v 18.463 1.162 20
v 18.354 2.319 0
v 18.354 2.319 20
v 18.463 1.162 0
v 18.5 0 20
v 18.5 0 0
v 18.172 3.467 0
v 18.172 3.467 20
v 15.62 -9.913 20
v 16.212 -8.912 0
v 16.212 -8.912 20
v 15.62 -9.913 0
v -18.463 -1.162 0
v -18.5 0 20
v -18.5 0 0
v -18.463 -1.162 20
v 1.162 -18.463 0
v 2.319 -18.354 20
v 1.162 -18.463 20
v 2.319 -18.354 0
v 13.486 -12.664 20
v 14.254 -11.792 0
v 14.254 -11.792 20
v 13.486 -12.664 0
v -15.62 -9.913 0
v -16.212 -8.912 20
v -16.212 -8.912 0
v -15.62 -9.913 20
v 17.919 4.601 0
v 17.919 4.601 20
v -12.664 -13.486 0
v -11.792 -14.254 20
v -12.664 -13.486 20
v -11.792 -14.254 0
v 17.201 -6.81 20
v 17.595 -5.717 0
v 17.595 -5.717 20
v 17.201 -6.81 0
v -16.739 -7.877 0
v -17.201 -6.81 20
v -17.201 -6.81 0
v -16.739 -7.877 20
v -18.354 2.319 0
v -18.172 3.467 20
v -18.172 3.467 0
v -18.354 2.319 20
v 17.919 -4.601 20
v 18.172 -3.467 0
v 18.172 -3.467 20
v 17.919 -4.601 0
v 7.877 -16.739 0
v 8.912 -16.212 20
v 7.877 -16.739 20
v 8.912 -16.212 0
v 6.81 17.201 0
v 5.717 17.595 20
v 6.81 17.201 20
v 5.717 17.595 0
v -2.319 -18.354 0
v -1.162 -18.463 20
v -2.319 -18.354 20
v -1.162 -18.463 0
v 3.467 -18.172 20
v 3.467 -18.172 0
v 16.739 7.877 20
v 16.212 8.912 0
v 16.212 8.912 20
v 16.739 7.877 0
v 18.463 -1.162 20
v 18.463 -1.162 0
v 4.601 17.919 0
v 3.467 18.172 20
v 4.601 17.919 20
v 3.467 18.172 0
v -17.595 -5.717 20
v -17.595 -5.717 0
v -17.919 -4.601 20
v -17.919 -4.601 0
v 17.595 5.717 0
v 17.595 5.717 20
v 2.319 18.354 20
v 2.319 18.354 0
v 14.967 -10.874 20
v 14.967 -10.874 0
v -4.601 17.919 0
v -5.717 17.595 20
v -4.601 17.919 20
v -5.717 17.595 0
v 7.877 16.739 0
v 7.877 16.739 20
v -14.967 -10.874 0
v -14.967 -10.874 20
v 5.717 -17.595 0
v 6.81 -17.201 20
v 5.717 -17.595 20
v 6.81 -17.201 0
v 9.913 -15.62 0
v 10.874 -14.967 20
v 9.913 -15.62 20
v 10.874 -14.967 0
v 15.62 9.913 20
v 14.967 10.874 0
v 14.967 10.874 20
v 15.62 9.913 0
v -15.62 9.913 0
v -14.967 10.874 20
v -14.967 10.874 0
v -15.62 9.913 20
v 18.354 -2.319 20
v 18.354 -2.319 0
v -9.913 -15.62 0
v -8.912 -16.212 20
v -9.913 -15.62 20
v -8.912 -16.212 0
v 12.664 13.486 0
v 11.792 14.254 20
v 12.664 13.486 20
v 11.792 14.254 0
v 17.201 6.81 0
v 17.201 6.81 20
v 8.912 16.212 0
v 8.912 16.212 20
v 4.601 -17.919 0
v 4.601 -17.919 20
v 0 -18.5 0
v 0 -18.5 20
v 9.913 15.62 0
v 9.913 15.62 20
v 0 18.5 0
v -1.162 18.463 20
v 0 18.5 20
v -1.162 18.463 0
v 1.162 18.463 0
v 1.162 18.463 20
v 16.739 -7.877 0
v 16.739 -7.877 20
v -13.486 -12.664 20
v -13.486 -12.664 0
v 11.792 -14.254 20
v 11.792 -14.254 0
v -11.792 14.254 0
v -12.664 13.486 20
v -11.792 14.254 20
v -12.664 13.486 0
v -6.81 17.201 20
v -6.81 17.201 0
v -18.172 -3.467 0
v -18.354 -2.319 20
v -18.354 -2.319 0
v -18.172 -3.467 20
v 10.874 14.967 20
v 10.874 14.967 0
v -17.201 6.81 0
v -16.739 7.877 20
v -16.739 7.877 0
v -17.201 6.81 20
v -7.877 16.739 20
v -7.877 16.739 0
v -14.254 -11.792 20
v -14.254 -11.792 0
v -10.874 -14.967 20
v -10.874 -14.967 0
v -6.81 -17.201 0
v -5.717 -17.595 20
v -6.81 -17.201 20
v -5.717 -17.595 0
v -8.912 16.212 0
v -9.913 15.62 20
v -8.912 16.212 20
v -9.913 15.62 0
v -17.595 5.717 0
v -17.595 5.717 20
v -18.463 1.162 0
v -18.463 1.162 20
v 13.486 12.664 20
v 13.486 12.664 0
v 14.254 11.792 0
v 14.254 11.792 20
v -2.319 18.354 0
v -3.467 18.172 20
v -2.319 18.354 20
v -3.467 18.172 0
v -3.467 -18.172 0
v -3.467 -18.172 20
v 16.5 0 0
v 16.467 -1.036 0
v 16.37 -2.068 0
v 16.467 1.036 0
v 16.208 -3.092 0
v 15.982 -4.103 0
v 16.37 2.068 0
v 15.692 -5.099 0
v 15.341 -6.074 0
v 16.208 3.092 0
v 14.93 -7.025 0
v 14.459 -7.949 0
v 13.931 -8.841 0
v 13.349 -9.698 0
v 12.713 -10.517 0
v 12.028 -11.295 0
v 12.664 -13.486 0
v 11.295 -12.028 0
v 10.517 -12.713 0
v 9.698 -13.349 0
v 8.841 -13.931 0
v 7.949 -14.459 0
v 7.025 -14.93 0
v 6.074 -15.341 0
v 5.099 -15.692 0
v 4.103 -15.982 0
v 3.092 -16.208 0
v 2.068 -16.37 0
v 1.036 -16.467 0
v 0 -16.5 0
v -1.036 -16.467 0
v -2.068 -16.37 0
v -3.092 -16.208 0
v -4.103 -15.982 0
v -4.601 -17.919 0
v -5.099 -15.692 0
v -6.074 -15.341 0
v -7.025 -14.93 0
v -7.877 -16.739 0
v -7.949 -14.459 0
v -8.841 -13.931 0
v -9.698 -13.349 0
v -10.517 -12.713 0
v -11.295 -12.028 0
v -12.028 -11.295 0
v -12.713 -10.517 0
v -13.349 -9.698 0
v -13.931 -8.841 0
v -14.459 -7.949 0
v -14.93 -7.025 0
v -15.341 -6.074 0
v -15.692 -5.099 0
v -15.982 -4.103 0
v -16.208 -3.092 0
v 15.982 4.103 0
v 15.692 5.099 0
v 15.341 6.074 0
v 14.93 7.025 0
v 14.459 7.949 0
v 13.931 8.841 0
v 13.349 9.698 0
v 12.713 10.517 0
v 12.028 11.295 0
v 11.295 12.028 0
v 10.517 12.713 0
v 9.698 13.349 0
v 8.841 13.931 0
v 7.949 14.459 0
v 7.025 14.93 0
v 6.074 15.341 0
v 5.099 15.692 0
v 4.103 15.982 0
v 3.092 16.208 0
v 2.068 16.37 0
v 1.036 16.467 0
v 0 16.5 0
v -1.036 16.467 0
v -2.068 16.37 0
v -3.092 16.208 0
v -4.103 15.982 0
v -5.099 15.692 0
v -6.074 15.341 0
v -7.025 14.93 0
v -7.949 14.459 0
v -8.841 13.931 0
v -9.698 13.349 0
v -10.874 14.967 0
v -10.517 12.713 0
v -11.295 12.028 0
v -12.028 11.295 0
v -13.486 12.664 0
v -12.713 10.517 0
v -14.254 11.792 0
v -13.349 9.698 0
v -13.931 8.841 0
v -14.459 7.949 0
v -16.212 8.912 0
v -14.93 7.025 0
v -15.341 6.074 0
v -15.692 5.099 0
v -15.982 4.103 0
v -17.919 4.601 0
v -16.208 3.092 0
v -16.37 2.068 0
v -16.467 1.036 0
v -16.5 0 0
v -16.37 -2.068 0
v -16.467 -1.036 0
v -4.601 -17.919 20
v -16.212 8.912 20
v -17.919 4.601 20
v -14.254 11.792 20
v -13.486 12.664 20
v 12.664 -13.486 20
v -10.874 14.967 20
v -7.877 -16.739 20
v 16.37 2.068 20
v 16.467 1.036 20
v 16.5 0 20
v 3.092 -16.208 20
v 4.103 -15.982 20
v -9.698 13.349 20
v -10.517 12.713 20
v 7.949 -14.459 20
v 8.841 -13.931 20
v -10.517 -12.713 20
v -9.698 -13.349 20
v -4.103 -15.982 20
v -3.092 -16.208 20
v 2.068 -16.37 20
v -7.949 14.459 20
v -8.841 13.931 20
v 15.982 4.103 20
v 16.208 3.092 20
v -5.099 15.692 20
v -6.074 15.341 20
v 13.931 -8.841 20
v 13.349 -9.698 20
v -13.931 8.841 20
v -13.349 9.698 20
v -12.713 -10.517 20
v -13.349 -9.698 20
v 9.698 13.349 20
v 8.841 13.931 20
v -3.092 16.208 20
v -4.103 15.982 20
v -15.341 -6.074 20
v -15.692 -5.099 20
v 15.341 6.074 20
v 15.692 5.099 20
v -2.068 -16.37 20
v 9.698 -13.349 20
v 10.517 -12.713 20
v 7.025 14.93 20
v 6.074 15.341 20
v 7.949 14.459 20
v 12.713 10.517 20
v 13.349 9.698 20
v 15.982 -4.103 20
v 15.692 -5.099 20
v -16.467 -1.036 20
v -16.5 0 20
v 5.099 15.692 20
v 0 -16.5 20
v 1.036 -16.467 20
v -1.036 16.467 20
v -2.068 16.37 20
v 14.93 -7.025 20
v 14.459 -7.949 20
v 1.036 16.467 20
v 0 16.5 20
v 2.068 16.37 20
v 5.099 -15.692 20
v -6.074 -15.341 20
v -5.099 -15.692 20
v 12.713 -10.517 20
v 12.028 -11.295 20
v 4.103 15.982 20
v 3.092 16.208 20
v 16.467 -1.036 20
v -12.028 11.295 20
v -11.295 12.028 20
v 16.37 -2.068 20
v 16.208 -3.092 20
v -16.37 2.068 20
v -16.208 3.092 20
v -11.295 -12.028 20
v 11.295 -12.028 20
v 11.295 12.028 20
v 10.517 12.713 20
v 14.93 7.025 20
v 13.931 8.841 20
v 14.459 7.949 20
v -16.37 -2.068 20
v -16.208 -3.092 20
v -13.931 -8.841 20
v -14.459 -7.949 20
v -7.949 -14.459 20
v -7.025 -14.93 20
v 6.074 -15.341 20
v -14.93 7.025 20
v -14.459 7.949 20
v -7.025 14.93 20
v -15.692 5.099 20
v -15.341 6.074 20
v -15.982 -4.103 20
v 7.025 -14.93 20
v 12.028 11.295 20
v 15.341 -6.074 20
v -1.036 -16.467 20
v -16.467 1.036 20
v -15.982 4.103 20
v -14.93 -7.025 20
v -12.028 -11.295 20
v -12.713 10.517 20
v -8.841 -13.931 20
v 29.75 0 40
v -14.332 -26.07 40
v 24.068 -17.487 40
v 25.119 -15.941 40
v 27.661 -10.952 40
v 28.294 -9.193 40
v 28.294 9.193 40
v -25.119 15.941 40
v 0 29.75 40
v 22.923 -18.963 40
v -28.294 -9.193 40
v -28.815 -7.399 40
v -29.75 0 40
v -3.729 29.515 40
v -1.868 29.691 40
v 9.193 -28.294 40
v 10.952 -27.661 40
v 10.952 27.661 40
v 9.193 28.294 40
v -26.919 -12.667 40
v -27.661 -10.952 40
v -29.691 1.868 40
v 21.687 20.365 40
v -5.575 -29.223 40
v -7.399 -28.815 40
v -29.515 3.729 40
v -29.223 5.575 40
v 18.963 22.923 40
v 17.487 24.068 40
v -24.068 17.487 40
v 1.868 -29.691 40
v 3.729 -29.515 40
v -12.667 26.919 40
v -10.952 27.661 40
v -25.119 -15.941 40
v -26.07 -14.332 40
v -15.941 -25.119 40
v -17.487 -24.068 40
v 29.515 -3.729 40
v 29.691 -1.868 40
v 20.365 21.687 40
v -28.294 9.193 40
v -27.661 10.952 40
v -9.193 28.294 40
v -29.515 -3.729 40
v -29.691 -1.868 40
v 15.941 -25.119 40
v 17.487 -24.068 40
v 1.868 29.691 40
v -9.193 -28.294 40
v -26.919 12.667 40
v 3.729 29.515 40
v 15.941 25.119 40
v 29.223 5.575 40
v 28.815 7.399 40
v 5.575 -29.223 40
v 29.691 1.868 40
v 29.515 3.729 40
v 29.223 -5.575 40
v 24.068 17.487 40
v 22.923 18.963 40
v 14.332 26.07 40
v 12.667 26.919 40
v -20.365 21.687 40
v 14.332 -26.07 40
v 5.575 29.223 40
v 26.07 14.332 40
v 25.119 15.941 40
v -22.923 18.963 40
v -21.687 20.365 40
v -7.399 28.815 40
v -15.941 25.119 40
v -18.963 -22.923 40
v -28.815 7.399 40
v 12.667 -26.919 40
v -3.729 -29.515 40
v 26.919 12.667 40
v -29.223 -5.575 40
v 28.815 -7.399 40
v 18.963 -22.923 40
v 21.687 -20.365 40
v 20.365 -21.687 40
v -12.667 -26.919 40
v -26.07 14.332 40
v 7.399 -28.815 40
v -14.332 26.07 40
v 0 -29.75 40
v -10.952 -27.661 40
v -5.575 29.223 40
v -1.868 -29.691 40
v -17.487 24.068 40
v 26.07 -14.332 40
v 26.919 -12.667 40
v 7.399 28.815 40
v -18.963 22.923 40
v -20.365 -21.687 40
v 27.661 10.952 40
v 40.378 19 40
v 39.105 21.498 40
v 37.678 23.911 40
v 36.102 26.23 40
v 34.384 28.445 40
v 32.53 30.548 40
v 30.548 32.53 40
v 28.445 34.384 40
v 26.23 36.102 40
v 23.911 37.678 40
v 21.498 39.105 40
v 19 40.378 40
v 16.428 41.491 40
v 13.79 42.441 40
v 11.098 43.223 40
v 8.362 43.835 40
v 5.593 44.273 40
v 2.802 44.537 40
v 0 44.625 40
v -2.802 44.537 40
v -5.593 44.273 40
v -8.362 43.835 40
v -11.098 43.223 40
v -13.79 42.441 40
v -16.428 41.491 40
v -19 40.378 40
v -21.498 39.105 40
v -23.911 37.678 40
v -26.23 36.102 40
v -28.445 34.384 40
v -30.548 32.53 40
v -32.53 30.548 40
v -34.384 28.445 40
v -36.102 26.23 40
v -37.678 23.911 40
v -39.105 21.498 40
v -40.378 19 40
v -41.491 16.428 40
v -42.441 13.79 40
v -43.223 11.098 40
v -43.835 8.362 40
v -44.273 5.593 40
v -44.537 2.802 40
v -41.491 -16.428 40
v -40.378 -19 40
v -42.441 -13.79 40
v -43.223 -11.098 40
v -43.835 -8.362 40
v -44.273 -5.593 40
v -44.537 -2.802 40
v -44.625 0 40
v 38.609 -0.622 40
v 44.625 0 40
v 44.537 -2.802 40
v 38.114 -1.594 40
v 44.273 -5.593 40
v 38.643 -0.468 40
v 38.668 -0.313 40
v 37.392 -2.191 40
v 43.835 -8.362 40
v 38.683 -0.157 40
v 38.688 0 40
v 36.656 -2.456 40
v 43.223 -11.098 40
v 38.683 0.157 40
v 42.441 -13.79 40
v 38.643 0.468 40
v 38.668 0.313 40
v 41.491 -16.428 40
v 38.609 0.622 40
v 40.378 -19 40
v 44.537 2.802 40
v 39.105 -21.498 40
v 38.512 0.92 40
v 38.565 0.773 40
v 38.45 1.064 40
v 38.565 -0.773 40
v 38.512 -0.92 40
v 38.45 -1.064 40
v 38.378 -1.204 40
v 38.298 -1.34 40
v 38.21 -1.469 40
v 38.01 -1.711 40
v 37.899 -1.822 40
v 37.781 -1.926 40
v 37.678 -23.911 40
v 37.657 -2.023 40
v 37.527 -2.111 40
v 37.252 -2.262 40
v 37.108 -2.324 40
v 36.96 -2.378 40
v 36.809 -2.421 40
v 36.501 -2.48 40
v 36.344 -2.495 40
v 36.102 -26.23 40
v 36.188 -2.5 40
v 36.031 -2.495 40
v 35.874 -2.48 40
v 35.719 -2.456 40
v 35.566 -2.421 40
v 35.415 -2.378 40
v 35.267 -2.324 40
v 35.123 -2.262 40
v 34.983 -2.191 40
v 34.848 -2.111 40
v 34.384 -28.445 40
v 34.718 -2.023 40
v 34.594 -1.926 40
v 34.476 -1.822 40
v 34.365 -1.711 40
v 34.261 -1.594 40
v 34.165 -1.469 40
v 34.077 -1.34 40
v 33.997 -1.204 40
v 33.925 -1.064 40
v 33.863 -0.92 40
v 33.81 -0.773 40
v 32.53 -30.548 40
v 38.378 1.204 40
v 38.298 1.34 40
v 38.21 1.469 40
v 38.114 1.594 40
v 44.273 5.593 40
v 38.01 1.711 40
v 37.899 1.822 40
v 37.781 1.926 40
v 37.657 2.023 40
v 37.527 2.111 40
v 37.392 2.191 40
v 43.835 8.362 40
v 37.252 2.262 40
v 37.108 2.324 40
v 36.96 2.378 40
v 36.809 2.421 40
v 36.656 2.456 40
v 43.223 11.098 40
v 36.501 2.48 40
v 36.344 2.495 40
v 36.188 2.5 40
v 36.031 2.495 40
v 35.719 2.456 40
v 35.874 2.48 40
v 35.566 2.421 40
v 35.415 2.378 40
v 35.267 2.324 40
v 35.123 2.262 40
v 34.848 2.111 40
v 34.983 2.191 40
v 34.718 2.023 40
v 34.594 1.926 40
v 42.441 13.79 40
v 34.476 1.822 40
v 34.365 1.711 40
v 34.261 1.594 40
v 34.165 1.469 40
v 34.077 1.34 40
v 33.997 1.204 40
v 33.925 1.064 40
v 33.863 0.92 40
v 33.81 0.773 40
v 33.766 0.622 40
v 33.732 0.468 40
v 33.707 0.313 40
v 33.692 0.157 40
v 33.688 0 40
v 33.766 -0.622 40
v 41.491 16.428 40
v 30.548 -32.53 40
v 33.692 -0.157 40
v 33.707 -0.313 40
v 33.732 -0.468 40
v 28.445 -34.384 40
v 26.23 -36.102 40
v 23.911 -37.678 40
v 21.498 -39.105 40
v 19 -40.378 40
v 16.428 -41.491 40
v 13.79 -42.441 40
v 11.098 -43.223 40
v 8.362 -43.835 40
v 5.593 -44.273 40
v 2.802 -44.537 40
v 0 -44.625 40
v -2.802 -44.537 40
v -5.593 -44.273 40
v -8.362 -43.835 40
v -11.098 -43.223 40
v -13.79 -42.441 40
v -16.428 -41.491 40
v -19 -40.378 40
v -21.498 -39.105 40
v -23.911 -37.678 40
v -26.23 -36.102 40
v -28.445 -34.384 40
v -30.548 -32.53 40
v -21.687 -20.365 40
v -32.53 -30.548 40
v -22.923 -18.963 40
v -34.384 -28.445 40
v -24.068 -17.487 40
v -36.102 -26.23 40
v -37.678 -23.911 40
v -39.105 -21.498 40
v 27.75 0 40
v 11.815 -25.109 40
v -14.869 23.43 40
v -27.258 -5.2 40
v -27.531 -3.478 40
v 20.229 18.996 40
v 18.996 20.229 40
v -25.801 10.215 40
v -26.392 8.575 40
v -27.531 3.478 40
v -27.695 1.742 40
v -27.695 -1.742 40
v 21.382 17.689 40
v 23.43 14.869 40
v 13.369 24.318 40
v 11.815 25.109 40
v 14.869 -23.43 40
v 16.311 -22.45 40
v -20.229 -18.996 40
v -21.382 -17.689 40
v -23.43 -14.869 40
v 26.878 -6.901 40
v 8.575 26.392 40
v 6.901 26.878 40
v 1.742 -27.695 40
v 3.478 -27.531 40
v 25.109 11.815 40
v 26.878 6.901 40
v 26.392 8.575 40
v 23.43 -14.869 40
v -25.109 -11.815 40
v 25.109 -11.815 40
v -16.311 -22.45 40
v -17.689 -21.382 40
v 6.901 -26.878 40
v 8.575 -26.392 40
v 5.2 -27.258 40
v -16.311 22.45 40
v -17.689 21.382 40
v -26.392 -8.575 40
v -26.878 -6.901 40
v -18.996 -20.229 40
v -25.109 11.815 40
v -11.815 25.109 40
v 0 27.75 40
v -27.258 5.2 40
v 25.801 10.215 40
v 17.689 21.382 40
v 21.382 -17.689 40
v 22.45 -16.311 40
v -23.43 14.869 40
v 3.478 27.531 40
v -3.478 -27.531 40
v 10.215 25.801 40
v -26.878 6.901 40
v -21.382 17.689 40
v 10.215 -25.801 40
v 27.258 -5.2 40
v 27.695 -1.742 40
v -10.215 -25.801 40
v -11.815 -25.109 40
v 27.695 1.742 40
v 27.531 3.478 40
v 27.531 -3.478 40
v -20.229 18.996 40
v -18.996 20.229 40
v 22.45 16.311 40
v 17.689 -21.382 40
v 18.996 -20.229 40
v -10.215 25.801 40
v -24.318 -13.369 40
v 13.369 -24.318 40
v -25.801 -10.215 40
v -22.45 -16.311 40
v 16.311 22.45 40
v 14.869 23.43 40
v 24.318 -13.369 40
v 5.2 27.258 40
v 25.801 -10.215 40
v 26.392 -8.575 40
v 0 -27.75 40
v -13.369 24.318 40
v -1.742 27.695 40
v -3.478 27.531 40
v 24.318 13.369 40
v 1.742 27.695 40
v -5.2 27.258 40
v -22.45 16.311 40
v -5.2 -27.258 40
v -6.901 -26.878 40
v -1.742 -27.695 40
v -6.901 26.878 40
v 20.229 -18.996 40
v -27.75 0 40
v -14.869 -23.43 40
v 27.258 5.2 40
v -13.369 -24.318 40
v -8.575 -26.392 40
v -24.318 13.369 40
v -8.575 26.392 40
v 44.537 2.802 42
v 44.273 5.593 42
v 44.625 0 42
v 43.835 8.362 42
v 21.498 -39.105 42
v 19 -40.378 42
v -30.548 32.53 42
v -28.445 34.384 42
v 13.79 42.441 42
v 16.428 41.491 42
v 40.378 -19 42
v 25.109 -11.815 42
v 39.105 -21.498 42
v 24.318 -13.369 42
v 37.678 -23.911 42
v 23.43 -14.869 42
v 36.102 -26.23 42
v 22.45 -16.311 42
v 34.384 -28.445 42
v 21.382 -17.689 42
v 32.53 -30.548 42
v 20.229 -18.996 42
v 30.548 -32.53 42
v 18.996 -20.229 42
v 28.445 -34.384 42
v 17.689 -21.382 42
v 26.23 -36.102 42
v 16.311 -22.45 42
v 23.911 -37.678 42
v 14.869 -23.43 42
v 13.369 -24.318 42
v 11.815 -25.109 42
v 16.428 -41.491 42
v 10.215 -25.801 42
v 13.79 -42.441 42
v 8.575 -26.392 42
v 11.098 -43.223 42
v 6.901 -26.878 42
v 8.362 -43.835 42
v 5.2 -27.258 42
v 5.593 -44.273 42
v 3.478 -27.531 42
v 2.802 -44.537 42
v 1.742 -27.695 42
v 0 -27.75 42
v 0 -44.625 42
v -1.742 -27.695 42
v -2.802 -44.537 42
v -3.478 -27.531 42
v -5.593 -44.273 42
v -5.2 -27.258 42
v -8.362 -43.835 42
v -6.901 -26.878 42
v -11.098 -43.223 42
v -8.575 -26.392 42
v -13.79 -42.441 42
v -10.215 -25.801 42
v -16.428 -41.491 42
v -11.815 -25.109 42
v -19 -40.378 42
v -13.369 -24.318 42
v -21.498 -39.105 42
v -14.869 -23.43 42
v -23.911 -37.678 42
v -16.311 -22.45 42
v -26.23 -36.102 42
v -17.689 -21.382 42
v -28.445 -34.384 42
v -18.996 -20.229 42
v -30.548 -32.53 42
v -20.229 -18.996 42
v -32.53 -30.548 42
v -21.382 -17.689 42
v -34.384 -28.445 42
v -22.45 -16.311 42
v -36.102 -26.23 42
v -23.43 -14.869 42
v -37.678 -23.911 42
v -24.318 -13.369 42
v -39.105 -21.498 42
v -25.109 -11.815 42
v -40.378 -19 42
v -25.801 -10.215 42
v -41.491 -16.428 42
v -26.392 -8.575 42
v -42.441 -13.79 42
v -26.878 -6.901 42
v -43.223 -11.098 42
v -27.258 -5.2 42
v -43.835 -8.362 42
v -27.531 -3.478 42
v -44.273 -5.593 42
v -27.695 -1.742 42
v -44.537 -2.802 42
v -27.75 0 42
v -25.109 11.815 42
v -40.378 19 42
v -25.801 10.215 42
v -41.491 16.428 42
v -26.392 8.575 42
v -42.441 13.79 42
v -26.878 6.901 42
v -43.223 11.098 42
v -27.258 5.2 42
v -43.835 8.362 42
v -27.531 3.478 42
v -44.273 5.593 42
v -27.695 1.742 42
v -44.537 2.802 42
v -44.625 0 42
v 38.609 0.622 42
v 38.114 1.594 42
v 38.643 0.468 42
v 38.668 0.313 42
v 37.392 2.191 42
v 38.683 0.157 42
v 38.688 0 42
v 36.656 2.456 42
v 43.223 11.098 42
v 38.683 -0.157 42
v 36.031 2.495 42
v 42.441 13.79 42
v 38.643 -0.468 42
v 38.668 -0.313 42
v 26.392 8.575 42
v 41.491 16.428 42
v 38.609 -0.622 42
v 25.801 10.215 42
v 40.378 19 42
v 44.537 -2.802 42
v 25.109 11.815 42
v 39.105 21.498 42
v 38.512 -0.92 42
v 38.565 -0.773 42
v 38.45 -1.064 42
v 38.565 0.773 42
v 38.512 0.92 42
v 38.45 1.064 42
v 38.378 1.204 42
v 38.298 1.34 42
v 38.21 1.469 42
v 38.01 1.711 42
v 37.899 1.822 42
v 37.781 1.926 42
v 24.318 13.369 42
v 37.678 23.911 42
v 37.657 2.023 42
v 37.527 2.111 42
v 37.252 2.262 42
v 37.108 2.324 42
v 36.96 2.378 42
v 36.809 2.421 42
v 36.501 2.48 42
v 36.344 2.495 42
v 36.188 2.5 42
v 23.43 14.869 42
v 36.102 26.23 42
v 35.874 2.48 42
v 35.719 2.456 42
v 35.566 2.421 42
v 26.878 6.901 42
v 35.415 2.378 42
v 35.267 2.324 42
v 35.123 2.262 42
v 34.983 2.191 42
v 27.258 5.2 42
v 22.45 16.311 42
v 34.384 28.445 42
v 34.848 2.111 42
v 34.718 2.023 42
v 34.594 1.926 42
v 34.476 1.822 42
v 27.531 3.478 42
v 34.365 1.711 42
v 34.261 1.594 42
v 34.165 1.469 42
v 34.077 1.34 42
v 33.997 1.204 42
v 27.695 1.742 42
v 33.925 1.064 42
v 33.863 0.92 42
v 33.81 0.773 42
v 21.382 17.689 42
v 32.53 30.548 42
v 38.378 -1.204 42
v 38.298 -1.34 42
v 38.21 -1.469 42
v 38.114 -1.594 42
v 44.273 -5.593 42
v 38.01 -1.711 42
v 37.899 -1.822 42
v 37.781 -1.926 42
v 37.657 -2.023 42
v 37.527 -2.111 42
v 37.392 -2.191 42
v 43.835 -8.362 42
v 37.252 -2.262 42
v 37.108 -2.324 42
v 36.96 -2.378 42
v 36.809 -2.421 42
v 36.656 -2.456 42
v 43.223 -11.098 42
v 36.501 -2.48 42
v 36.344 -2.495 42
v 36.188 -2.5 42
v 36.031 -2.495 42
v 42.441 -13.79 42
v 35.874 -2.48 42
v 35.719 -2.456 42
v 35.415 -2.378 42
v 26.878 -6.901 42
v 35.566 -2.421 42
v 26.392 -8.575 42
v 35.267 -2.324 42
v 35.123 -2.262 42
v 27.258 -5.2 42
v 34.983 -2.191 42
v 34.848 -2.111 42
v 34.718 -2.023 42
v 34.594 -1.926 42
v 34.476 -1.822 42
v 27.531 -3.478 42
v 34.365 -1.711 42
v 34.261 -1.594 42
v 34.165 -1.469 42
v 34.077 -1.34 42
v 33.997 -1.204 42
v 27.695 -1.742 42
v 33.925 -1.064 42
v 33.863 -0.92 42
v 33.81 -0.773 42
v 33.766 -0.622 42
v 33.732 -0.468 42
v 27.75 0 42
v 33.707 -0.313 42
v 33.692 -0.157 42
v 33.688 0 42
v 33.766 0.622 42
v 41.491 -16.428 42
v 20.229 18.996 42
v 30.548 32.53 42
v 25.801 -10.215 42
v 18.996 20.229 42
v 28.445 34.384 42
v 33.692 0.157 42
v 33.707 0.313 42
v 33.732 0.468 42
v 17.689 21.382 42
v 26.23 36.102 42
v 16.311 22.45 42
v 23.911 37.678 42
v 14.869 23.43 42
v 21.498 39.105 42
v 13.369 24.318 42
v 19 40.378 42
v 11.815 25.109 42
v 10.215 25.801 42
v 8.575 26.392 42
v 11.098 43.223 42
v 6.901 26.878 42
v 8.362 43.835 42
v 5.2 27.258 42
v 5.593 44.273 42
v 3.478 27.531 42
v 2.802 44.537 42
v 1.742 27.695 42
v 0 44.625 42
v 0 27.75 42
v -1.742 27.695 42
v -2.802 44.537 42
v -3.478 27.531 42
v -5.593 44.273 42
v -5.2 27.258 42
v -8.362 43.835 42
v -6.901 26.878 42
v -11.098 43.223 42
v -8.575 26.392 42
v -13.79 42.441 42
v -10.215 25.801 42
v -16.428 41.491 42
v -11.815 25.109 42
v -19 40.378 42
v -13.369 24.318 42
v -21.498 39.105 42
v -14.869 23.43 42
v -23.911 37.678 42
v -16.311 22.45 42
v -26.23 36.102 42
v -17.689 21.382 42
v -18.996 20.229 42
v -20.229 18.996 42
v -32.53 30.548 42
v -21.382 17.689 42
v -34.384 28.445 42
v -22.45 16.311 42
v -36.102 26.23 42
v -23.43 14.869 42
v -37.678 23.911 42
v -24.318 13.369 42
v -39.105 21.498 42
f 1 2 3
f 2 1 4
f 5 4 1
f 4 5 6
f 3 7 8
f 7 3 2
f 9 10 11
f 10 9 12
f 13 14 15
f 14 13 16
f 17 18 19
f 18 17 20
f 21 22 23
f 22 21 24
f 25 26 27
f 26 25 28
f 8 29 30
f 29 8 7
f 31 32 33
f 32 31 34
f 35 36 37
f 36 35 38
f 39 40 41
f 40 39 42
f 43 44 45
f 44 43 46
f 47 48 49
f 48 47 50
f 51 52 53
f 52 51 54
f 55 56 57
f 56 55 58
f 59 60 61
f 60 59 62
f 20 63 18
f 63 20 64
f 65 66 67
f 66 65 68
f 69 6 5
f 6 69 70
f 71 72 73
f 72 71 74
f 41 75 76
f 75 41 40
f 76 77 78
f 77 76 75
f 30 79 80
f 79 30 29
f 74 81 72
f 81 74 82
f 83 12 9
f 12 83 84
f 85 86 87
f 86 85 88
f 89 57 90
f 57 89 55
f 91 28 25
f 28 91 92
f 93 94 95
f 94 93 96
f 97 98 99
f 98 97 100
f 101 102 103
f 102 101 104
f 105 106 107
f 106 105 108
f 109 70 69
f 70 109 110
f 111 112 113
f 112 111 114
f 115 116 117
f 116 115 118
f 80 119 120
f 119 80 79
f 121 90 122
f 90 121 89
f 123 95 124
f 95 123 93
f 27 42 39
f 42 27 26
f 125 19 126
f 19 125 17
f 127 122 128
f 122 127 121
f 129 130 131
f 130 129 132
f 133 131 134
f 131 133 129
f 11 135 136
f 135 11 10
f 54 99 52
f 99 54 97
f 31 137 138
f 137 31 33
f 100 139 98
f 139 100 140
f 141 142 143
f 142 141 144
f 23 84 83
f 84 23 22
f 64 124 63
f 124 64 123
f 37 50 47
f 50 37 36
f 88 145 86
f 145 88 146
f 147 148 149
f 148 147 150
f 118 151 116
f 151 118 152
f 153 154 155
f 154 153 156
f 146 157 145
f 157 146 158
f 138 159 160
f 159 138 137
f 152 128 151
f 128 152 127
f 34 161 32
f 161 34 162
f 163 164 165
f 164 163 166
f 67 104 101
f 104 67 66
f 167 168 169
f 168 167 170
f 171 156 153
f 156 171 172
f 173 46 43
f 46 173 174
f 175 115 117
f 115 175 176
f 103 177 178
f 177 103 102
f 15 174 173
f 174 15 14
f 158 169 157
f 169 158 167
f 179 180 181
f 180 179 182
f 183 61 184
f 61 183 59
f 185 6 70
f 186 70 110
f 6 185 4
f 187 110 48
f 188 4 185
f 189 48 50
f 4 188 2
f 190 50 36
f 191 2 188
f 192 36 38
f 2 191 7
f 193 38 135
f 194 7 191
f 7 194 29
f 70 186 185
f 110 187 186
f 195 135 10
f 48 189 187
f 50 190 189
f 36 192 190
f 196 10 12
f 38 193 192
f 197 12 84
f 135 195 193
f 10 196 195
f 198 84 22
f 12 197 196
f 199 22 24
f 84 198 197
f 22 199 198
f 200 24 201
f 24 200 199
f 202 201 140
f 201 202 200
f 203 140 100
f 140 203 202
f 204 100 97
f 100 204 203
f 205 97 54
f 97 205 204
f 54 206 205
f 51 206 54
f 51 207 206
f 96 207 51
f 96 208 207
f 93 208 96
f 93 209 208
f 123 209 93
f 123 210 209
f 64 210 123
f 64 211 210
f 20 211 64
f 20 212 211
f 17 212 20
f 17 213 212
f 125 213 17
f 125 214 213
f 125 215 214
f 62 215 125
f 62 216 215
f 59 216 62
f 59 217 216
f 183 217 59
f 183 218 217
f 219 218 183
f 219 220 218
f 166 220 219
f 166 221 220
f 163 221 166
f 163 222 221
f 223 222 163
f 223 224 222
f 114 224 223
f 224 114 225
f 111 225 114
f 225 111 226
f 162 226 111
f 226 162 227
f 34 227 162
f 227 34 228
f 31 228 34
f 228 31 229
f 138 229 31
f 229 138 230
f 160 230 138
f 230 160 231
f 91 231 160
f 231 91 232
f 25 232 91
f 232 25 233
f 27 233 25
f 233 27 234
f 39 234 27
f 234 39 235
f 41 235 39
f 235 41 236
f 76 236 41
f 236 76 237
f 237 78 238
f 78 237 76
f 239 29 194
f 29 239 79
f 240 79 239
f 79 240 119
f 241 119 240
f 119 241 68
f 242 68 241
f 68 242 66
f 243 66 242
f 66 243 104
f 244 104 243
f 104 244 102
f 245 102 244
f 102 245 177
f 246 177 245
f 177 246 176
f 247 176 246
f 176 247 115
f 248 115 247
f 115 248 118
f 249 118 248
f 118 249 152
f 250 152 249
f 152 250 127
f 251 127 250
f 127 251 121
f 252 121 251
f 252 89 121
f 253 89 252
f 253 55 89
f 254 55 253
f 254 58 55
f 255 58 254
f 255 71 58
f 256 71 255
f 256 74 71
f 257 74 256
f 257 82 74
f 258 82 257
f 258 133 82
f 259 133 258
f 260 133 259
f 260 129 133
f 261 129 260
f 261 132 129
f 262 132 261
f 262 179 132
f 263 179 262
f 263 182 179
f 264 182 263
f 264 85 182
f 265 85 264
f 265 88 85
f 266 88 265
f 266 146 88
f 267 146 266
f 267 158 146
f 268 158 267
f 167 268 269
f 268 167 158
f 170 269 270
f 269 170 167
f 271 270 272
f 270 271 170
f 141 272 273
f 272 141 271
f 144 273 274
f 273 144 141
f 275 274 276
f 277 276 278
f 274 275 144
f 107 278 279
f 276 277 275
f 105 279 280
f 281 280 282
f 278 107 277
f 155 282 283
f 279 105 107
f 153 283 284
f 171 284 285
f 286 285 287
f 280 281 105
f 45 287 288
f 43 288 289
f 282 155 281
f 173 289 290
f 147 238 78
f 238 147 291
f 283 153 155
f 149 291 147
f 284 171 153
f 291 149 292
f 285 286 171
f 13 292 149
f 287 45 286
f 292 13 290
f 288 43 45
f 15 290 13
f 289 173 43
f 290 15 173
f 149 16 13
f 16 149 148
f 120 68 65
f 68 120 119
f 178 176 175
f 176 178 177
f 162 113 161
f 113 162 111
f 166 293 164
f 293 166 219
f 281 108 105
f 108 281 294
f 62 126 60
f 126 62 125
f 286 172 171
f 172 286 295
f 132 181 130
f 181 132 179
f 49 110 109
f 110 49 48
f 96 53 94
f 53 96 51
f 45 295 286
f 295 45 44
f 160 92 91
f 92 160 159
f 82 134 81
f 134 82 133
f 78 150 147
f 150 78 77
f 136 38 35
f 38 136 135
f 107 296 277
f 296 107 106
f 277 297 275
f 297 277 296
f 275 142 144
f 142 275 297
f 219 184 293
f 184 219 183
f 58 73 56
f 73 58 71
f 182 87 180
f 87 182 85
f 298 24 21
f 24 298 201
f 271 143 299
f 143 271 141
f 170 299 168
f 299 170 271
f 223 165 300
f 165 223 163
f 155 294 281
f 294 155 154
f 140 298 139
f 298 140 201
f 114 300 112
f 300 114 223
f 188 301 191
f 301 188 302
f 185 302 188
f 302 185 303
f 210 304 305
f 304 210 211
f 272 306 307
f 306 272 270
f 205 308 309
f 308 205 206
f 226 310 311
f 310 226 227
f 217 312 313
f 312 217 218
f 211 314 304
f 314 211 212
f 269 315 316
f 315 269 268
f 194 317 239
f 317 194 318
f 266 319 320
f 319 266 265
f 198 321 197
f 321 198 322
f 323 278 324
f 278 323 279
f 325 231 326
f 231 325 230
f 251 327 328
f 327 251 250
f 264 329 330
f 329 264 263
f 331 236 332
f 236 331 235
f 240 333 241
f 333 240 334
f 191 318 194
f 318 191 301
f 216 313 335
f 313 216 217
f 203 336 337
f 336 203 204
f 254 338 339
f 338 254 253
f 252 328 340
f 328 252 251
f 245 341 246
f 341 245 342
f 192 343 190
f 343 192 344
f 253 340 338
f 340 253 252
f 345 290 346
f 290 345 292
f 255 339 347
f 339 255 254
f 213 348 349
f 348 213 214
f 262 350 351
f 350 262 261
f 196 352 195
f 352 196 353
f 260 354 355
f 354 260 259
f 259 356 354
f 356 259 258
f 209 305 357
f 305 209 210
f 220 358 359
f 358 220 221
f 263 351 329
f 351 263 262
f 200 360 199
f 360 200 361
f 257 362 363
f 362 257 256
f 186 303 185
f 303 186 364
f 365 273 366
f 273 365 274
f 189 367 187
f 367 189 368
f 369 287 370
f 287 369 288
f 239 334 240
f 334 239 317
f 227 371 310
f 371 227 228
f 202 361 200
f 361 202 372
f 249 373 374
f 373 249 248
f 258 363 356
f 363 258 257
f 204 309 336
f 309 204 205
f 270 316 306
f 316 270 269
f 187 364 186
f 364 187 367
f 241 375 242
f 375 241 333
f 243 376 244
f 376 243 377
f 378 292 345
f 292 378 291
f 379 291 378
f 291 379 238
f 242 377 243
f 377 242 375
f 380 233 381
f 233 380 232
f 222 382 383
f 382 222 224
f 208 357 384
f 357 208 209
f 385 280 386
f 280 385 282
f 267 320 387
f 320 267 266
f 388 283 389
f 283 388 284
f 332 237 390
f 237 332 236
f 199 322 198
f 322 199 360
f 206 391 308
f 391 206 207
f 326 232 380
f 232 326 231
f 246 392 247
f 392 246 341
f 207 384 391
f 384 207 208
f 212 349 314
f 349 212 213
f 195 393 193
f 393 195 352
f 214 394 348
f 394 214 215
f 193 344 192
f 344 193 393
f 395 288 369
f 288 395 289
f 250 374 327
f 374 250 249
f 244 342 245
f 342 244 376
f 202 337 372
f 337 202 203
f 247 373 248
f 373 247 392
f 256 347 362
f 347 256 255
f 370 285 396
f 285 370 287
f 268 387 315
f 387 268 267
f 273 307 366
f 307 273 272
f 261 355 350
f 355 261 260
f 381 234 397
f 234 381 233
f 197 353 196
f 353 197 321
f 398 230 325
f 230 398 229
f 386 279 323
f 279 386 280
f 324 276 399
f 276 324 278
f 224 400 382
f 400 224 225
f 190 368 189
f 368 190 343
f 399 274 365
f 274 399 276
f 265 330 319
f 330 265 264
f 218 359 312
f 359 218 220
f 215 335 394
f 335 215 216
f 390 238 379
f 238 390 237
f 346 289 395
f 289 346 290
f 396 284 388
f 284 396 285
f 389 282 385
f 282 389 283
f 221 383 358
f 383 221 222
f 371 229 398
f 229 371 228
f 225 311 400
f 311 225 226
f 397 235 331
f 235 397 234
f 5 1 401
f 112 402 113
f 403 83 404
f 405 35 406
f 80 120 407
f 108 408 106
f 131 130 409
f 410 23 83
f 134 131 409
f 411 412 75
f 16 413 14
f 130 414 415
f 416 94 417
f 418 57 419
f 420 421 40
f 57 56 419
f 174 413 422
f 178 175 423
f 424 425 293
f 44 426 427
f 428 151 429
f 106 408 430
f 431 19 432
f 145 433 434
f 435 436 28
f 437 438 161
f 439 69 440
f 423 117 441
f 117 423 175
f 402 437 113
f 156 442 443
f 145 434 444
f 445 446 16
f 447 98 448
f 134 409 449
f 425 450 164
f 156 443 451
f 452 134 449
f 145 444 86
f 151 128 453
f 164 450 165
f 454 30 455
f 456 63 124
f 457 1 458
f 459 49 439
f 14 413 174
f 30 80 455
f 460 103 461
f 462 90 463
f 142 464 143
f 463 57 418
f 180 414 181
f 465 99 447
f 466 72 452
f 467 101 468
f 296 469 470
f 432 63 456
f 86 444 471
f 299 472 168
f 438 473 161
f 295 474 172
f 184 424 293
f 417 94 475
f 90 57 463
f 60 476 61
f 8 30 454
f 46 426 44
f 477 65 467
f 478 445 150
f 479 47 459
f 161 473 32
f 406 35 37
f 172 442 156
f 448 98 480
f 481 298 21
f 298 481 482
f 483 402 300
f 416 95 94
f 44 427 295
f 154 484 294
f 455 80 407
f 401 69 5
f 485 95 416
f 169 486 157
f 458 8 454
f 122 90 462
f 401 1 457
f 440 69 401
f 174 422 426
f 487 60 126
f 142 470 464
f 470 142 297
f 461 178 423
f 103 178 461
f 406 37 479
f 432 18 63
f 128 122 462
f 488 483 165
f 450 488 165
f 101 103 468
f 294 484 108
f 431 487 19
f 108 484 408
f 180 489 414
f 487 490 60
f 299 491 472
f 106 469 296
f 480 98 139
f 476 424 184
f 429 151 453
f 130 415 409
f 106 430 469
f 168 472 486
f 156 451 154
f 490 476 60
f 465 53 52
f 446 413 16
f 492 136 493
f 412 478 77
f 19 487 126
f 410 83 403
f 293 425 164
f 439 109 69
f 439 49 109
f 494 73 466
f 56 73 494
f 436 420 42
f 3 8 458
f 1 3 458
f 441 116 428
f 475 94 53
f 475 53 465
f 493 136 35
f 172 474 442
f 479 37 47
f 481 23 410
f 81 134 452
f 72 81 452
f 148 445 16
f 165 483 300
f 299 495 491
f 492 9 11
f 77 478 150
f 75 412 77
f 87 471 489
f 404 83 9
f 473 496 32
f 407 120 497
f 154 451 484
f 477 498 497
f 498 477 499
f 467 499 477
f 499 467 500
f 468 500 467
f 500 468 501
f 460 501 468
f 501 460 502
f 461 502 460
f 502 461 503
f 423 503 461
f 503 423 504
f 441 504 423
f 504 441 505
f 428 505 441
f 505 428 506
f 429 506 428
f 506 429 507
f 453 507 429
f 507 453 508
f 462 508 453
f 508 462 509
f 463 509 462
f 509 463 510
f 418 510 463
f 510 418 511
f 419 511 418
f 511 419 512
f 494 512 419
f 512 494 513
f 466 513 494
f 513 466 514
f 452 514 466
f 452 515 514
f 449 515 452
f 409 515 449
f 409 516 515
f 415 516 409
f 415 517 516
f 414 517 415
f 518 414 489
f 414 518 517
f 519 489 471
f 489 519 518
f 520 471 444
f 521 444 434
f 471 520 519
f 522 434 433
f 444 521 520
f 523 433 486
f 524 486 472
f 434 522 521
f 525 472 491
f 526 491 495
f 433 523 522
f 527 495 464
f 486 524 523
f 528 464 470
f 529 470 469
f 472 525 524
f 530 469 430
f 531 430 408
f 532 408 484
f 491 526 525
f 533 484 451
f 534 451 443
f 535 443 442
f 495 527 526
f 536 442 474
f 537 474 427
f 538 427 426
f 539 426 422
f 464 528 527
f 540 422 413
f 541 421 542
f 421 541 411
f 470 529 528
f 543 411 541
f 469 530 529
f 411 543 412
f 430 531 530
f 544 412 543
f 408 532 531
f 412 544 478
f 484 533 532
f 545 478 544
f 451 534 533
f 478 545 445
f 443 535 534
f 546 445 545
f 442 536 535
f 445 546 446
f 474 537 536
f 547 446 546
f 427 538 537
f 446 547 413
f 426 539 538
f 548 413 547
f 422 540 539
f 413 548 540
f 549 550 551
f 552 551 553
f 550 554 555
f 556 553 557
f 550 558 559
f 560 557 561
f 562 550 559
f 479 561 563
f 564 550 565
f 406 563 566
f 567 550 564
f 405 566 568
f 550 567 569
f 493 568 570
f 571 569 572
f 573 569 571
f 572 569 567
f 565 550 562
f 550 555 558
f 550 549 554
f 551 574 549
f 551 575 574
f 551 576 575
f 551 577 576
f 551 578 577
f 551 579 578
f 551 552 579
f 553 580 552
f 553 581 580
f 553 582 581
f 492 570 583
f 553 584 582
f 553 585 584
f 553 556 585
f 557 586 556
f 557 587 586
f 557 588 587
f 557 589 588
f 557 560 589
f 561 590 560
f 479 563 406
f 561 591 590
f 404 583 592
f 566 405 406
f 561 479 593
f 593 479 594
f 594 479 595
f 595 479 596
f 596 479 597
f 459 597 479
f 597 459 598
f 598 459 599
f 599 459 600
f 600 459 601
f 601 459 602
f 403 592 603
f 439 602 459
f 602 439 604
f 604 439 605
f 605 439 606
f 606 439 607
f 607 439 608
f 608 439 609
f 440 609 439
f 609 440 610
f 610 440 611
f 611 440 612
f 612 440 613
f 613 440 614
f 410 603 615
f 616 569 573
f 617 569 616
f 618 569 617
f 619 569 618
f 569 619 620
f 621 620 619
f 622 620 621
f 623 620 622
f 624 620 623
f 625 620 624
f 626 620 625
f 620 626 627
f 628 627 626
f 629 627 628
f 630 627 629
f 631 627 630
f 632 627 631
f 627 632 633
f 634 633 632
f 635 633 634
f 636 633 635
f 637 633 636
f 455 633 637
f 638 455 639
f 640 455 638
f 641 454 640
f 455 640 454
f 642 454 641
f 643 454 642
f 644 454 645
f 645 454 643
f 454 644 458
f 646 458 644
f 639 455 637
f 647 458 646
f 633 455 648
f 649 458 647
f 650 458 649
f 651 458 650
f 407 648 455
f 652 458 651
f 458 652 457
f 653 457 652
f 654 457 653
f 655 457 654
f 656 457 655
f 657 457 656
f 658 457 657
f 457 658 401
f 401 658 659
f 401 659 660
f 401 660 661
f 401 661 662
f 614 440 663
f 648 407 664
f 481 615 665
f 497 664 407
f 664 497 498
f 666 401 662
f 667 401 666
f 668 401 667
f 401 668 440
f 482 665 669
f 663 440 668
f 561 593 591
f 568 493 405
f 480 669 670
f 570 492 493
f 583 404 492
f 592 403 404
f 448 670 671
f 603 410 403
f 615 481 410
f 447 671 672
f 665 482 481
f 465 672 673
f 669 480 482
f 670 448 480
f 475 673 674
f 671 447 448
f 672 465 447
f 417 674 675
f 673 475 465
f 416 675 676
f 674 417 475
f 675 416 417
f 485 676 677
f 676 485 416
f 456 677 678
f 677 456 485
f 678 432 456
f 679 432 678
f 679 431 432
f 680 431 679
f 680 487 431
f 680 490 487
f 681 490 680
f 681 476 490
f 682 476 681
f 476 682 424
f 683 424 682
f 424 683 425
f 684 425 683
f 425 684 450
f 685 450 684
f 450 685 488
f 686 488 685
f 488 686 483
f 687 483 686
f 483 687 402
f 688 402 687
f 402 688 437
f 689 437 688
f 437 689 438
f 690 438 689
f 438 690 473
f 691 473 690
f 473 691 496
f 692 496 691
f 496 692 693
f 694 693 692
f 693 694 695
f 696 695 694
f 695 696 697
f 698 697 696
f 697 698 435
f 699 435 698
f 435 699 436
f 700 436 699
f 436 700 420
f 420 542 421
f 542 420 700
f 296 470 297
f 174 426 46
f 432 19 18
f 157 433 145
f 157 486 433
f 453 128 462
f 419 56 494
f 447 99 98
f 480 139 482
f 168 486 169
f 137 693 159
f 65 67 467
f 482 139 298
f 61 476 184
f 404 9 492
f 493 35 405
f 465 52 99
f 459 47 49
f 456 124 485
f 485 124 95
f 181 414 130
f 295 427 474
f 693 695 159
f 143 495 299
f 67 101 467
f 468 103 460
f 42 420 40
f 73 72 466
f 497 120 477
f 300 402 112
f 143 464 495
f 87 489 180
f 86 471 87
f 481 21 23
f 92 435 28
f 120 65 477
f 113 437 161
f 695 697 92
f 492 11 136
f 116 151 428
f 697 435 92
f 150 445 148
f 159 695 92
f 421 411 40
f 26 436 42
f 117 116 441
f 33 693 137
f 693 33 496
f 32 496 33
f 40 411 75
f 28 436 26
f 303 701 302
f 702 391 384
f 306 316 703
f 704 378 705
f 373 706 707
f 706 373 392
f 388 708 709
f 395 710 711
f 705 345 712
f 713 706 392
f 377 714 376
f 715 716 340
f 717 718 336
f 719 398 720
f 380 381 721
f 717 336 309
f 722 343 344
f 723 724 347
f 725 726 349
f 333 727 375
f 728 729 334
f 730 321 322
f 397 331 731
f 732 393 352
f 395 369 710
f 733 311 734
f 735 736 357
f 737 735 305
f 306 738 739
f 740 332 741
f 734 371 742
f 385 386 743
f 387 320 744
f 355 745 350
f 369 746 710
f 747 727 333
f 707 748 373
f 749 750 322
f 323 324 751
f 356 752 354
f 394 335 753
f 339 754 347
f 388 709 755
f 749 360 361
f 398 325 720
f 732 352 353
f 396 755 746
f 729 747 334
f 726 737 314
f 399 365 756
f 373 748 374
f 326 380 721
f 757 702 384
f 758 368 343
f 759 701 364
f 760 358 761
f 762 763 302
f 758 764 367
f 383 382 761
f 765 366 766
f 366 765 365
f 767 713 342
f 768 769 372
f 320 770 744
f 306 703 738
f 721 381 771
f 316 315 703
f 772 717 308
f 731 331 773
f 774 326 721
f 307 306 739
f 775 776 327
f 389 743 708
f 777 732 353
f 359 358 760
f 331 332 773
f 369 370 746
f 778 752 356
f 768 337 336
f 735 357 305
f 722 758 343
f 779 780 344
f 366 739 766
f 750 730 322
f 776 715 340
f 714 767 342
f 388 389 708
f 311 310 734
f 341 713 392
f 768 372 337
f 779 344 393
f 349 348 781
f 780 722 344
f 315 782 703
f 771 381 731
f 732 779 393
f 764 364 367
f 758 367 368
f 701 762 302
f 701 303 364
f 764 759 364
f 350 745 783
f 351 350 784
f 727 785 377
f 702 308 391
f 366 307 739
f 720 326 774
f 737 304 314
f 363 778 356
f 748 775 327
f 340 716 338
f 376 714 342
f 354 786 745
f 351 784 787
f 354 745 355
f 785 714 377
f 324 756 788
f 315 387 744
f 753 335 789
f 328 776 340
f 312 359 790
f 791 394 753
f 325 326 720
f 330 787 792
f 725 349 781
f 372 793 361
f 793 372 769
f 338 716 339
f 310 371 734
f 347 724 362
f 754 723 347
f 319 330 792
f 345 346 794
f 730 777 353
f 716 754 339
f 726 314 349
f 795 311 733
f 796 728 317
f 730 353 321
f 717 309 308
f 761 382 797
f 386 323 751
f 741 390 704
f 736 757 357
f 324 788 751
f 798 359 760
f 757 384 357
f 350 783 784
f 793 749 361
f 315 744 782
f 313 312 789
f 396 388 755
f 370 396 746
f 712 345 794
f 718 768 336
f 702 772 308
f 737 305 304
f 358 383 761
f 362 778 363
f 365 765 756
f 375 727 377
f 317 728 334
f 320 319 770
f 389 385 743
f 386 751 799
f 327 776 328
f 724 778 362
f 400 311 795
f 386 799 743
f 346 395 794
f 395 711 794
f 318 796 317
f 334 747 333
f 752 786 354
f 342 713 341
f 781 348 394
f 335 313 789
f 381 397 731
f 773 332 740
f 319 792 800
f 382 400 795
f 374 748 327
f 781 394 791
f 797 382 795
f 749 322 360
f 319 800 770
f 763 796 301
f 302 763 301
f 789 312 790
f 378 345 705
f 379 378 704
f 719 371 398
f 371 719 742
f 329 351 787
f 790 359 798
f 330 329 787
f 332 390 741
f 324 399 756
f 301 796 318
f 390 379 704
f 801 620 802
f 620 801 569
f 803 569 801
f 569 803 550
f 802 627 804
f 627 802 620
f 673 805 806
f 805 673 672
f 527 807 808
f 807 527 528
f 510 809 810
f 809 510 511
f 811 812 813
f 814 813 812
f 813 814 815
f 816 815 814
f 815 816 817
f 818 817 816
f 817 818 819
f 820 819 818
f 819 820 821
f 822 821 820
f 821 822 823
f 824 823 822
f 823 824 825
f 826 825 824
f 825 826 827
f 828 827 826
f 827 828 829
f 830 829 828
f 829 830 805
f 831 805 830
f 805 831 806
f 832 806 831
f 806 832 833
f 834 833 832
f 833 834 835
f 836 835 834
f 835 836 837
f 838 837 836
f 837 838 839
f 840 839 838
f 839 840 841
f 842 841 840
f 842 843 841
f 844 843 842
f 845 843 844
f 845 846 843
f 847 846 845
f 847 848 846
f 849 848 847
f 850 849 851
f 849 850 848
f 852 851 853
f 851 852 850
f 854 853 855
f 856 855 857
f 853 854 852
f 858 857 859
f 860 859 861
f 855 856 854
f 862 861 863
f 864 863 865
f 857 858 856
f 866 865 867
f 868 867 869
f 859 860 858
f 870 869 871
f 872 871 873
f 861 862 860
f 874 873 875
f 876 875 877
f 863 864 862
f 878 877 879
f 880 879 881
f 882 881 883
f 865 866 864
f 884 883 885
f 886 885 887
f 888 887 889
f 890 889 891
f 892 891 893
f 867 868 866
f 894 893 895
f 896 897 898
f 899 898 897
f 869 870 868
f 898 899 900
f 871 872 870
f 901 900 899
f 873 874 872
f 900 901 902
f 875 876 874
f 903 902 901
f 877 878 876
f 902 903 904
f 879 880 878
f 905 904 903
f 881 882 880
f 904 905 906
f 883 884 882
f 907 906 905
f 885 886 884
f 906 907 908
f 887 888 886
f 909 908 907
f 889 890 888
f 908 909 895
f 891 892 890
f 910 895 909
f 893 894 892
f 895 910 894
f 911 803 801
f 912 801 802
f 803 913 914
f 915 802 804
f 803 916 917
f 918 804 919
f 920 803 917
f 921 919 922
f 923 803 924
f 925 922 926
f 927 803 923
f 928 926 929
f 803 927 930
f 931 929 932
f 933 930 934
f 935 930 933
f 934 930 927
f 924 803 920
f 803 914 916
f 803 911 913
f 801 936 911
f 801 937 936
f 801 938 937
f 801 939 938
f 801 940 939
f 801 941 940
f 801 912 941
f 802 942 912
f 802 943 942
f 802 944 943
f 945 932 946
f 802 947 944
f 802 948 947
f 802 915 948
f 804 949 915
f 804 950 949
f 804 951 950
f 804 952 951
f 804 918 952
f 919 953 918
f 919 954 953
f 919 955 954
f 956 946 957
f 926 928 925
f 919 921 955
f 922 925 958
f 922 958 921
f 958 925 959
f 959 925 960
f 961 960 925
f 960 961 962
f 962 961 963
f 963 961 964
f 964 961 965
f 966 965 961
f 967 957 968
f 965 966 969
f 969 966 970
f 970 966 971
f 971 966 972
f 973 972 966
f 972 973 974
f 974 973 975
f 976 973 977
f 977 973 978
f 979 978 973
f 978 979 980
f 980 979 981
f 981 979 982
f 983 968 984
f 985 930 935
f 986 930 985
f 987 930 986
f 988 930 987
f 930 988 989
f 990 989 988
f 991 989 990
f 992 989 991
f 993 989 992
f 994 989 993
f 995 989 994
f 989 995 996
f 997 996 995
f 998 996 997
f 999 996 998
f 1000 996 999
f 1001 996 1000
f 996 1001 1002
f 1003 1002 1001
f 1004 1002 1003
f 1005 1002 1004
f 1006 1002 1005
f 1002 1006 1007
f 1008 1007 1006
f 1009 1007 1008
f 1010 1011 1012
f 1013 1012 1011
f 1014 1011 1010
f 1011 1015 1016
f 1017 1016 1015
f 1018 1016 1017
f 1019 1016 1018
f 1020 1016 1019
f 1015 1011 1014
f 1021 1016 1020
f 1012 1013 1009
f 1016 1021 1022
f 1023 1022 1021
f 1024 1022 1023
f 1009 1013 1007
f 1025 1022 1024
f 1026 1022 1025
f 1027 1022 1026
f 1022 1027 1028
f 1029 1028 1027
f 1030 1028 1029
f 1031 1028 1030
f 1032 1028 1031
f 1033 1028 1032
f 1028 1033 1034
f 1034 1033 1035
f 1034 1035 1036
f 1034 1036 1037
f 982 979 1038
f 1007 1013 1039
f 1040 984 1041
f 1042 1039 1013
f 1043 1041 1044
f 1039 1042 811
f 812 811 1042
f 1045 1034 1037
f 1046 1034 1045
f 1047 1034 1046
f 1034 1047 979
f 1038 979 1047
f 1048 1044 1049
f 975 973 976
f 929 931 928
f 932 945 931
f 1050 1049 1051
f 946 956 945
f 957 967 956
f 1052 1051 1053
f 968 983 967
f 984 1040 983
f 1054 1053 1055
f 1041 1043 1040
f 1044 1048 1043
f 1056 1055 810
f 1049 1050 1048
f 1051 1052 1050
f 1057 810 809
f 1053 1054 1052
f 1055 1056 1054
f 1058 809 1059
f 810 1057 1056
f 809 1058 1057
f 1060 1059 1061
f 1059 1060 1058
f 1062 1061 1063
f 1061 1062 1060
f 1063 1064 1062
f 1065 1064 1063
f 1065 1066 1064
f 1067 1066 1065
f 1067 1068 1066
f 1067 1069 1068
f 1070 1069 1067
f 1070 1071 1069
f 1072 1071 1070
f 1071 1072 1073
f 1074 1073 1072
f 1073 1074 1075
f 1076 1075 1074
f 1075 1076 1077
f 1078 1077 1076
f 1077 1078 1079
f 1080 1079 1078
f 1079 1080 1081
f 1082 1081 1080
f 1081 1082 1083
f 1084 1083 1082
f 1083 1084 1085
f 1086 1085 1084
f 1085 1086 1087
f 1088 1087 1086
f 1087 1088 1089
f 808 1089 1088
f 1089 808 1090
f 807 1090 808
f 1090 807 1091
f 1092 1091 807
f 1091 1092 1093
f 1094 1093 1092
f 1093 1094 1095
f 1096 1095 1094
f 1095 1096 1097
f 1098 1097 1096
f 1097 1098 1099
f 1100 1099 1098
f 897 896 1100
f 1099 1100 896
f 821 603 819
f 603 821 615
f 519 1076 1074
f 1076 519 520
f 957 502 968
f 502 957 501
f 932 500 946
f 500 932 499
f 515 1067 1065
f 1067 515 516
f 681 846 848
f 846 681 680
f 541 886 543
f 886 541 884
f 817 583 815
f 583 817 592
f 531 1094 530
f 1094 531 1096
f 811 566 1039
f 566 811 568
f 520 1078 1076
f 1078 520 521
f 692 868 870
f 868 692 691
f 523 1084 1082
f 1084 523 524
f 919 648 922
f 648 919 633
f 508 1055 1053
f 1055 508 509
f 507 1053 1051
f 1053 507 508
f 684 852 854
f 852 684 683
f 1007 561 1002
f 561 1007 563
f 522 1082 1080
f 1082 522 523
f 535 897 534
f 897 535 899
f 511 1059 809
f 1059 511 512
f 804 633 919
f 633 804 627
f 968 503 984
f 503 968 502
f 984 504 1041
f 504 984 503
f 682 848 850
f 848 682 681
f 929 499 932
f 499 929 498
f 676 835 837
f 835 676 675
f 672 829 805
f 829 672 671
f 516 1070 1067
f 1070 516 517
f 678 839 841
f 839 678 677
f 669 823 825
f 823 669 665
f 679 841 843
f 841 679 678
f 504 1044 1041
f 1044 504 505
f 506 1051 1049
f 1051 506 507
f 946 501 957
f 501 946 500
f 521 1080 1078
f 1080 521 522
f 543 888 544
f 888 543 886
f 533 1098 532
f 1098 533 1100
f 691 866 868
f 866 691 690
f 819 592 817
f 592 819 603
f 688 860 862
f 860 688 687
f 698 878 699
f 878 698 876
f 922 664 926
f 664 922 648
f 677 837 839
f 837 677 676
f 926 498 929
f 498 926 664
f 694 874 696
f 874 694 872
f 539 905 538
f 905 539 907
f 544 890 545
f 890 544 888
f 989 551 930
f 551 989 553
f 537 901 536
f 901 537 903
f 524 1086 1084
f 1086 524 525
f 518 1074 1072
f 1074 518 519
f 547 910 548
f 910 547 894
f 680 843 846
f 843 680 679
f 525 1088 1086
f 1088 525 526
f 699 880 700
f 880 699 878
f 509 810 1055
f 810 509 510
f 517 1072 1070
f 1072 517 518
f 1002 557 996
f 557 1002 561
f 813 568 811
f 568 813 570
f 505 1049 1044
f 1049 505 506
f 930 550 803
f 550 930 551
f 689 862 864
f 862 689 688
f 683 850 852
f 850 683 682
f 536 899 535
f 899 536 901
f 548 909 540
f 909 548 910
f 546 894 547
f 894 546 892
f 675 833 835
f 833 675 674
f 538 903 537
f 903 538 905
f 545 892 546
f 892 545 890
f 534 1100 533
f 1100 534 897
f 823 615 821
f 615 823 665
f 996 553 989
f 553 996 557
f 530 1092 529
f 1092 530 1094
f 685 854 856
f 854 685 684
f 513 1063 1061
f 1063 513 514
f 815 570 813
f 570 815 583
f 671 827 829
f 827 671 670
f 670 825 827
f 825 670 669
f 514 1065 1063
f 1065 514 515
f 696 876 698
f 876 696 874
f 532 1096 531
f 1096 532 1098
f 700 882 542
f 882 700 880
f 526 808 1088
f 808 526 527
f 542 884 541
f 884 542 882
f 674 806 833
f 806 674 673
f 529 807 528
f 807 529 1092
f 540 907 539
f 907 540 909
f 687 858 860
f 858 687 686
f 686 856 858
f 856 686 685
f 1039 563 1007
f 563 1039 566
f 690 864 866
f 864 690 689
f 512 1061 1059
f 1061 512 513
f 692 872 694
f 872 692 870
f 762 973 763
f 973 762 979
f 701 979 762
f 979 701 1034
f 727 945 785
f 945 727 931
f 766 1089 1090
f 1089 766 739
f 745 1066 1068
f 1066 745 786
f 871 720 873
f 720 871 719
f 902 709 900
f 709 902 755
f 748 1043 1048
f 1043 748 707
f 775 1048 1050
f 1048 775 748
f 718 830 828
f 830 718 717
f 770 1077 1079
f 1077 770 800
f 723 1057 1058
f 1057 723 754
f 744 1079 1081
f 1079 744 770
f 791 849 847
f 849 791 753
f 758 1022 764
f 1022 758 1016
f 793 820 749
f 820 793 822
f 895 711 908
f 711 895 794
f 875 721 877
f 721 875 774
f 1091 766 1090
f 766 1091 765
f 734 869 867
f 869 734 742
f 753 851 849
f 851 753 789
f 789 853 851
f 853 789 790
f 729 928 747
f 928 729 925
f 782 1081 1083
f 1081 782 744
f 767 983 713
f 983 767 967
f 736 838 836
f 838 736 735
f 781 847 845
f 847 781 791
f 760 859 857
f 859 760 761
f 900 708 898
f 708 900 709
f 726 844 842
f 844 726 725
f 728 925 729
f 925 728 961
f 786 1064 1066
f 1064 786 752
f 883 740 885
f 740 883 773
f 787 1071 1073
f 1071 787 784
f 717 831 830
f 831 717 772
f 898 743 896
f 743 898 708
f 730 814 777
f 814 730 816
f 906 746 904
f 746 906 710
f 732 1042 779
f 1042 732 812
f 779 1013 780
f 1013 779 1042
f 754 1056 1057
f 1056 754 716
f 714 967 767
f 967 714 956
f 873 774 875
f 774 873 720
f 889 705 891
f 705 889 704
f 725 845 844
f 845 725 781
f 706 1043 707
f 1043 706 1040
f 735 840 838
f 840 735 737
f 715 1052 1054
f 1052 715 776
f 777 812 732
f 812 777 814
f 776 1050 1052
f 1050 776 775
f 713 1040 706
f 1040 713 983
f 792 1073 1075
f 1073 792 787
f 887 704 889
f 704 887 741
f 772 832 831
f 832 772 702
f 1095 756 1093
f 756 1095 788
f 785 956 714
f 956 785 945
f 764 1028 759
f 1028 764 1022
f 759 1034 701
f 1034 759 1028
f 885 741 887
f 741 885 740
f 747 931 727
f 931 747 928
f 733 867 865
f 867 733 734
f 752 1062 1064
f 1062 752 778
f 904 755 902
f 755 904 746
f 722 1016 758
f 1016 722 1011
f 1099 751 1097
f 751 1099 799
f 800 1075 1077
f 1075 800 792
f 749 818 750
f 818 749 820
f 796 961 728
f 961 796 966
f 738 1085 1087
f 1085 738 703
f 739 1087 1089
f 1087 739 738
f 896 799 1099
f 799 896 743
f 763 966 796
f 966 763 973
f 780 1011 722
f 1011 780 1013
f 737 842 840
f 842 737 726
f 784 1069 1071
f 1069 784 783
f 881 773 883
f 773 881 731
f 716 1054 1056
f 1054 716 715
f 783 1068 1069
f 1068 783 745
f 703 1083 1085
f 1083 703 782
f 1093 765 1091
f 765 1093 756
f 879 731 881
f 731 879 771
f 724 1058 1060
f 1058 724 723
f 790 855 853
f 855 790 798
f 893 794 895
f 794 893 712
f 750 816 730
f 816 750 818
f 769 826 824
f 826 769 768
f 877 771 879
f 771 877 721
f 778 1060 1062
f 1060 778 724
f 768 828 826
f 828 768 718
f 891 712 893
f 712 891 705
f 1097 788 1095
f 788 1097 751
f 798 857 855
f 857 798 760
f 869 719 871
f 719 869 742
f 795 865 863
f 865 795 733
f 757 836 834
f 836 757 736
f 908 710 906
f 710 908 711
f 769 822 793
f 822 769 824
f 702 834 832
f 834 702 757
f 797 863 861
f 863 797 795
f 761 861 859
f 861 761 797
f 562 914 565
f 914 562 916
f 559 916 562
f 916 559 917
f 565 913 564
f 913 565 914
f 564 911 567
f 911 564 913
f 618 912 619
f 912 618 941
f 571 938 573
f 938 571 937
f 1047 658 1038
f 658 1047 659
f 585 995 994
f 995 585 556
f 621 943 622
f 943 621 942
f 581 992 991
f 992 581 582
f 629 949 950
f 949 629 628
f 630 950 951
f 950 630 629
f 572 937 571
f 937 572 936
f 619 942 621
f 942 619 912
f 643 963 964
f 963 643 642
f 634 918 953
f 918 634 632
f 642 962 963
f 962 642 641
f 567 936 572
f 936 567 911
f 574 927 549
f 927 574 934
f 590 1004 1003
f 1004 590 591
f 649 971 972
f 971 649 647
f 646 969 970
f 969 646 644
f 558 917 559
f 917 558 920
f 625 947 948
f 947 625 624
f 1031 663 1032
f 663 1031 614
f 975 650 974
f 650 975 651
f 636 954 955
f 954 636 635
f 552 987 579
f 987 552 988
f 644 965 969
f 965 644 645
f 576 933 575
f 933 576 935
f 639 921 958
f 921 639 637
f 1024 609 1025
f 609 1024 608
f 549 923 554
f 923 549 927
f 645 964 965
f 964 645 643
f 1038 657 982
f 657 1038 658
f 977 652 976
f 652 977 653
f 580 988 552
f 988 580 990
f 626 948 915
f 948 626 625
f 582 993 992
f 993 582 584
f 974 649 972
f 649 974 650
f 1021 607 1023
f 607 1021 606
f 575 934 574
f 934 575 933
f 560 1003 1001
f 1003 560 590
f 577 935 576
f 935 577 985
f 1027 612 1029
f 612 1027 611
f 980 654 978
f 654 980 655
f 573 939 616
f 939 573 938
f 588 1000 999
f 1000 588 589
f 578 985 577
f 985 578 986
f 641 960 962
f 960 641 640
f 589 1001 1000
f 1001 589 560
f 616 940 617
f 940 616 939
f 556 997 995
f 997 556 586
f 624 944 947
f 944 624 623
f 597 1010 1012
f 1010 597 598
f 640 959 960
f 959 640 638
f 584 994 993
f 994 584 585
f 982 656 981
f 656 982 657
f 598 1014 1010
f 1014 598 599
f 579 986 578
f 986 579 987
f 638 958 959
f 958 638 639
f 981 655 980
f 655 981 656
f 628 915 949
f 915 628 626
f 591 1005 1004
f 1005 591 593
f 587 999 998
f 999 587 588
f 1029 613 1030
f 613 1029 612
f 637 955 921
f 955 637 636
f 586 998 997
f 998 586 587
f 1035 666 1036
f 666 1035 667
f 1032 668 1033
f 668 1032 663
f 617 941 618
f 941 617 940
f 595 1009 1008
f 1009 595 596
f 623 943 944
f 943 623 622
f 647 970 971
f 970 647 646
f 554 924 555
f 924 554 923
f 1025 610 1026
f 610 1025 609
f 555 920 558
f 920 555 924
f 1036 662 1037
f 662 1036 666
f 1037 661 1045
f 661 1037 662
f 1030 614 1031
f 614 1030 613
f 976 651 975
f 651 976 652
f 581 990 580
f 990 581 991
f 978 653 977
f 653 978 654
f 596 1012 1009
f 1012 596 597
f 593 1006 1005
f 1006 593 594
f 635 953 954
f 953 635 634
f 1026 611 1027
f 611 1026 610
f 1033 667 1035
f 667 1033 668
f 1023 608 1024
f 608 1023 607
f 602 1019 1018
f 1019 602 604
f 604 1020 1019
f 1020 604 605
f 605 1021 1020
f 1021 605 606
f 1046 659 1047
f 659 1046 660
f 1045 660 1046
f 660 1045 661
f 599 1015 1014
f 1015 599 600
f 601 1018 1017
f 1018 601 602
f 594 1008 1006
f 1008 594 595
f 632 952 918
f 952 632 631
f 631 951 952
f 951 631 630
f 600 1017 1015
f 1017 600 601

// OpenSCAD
$fn=100;
wall_thickness = 2;
section_length = 20;

start_int_dia = 33;
start_ext_dia = start_int_dia + 2 * wall_thickness;
end_ext_dia = 59.5;
end_int_dia = end_ext_dia - 2 * wall_thickness;
flange_dia = end_ext_dia * 1.5;

mounting_hole_dia = 5;


module start_tube() {
    difference() {
        cylinder(section_length, d = start_ext_dia);
        cylinder(section_length, d = start_int_dia);
    }
}

module middle_tube() {
    difference() {
        cylinder(section_length, d1 = start_ext_dia, d2 = end_ext_dia);
        cylinder(section_length, d1 = start_int_dia, d2 = end_int_dia);
    }
}

module end_flange_hole() {
    translate([end_int_dia/2 + (flange_dia/2 - end_int_dia/2)/2, 0, 0])
        # cylinder(wall_thickness, d = mounting_hole_dia);
}

module end_flange_holes() {
    angles = [ for (a = [0 : 360 : 90]) a ];
        
    for(a = angles) {
        rotate(a) end_flange_hole();
    }
}

module end_flange() {
    difference() {
        cylinder(wall_thickness, d = flange_dia);
        cylinder(wall_thickness, d = end_int_dia);
    }
}

module adaptor() {
    start_tube();
    translate([0, 0, section_length]) middle_tube();
    translate([0, 0, section_length*2]) end_flange();
}

module holy_adaptor() {
    difference() {
        adaptor();
        translate([0, 0, section_length*2]) end_flange_holes();
    }
}
        


holy_adaptor();
    
    
